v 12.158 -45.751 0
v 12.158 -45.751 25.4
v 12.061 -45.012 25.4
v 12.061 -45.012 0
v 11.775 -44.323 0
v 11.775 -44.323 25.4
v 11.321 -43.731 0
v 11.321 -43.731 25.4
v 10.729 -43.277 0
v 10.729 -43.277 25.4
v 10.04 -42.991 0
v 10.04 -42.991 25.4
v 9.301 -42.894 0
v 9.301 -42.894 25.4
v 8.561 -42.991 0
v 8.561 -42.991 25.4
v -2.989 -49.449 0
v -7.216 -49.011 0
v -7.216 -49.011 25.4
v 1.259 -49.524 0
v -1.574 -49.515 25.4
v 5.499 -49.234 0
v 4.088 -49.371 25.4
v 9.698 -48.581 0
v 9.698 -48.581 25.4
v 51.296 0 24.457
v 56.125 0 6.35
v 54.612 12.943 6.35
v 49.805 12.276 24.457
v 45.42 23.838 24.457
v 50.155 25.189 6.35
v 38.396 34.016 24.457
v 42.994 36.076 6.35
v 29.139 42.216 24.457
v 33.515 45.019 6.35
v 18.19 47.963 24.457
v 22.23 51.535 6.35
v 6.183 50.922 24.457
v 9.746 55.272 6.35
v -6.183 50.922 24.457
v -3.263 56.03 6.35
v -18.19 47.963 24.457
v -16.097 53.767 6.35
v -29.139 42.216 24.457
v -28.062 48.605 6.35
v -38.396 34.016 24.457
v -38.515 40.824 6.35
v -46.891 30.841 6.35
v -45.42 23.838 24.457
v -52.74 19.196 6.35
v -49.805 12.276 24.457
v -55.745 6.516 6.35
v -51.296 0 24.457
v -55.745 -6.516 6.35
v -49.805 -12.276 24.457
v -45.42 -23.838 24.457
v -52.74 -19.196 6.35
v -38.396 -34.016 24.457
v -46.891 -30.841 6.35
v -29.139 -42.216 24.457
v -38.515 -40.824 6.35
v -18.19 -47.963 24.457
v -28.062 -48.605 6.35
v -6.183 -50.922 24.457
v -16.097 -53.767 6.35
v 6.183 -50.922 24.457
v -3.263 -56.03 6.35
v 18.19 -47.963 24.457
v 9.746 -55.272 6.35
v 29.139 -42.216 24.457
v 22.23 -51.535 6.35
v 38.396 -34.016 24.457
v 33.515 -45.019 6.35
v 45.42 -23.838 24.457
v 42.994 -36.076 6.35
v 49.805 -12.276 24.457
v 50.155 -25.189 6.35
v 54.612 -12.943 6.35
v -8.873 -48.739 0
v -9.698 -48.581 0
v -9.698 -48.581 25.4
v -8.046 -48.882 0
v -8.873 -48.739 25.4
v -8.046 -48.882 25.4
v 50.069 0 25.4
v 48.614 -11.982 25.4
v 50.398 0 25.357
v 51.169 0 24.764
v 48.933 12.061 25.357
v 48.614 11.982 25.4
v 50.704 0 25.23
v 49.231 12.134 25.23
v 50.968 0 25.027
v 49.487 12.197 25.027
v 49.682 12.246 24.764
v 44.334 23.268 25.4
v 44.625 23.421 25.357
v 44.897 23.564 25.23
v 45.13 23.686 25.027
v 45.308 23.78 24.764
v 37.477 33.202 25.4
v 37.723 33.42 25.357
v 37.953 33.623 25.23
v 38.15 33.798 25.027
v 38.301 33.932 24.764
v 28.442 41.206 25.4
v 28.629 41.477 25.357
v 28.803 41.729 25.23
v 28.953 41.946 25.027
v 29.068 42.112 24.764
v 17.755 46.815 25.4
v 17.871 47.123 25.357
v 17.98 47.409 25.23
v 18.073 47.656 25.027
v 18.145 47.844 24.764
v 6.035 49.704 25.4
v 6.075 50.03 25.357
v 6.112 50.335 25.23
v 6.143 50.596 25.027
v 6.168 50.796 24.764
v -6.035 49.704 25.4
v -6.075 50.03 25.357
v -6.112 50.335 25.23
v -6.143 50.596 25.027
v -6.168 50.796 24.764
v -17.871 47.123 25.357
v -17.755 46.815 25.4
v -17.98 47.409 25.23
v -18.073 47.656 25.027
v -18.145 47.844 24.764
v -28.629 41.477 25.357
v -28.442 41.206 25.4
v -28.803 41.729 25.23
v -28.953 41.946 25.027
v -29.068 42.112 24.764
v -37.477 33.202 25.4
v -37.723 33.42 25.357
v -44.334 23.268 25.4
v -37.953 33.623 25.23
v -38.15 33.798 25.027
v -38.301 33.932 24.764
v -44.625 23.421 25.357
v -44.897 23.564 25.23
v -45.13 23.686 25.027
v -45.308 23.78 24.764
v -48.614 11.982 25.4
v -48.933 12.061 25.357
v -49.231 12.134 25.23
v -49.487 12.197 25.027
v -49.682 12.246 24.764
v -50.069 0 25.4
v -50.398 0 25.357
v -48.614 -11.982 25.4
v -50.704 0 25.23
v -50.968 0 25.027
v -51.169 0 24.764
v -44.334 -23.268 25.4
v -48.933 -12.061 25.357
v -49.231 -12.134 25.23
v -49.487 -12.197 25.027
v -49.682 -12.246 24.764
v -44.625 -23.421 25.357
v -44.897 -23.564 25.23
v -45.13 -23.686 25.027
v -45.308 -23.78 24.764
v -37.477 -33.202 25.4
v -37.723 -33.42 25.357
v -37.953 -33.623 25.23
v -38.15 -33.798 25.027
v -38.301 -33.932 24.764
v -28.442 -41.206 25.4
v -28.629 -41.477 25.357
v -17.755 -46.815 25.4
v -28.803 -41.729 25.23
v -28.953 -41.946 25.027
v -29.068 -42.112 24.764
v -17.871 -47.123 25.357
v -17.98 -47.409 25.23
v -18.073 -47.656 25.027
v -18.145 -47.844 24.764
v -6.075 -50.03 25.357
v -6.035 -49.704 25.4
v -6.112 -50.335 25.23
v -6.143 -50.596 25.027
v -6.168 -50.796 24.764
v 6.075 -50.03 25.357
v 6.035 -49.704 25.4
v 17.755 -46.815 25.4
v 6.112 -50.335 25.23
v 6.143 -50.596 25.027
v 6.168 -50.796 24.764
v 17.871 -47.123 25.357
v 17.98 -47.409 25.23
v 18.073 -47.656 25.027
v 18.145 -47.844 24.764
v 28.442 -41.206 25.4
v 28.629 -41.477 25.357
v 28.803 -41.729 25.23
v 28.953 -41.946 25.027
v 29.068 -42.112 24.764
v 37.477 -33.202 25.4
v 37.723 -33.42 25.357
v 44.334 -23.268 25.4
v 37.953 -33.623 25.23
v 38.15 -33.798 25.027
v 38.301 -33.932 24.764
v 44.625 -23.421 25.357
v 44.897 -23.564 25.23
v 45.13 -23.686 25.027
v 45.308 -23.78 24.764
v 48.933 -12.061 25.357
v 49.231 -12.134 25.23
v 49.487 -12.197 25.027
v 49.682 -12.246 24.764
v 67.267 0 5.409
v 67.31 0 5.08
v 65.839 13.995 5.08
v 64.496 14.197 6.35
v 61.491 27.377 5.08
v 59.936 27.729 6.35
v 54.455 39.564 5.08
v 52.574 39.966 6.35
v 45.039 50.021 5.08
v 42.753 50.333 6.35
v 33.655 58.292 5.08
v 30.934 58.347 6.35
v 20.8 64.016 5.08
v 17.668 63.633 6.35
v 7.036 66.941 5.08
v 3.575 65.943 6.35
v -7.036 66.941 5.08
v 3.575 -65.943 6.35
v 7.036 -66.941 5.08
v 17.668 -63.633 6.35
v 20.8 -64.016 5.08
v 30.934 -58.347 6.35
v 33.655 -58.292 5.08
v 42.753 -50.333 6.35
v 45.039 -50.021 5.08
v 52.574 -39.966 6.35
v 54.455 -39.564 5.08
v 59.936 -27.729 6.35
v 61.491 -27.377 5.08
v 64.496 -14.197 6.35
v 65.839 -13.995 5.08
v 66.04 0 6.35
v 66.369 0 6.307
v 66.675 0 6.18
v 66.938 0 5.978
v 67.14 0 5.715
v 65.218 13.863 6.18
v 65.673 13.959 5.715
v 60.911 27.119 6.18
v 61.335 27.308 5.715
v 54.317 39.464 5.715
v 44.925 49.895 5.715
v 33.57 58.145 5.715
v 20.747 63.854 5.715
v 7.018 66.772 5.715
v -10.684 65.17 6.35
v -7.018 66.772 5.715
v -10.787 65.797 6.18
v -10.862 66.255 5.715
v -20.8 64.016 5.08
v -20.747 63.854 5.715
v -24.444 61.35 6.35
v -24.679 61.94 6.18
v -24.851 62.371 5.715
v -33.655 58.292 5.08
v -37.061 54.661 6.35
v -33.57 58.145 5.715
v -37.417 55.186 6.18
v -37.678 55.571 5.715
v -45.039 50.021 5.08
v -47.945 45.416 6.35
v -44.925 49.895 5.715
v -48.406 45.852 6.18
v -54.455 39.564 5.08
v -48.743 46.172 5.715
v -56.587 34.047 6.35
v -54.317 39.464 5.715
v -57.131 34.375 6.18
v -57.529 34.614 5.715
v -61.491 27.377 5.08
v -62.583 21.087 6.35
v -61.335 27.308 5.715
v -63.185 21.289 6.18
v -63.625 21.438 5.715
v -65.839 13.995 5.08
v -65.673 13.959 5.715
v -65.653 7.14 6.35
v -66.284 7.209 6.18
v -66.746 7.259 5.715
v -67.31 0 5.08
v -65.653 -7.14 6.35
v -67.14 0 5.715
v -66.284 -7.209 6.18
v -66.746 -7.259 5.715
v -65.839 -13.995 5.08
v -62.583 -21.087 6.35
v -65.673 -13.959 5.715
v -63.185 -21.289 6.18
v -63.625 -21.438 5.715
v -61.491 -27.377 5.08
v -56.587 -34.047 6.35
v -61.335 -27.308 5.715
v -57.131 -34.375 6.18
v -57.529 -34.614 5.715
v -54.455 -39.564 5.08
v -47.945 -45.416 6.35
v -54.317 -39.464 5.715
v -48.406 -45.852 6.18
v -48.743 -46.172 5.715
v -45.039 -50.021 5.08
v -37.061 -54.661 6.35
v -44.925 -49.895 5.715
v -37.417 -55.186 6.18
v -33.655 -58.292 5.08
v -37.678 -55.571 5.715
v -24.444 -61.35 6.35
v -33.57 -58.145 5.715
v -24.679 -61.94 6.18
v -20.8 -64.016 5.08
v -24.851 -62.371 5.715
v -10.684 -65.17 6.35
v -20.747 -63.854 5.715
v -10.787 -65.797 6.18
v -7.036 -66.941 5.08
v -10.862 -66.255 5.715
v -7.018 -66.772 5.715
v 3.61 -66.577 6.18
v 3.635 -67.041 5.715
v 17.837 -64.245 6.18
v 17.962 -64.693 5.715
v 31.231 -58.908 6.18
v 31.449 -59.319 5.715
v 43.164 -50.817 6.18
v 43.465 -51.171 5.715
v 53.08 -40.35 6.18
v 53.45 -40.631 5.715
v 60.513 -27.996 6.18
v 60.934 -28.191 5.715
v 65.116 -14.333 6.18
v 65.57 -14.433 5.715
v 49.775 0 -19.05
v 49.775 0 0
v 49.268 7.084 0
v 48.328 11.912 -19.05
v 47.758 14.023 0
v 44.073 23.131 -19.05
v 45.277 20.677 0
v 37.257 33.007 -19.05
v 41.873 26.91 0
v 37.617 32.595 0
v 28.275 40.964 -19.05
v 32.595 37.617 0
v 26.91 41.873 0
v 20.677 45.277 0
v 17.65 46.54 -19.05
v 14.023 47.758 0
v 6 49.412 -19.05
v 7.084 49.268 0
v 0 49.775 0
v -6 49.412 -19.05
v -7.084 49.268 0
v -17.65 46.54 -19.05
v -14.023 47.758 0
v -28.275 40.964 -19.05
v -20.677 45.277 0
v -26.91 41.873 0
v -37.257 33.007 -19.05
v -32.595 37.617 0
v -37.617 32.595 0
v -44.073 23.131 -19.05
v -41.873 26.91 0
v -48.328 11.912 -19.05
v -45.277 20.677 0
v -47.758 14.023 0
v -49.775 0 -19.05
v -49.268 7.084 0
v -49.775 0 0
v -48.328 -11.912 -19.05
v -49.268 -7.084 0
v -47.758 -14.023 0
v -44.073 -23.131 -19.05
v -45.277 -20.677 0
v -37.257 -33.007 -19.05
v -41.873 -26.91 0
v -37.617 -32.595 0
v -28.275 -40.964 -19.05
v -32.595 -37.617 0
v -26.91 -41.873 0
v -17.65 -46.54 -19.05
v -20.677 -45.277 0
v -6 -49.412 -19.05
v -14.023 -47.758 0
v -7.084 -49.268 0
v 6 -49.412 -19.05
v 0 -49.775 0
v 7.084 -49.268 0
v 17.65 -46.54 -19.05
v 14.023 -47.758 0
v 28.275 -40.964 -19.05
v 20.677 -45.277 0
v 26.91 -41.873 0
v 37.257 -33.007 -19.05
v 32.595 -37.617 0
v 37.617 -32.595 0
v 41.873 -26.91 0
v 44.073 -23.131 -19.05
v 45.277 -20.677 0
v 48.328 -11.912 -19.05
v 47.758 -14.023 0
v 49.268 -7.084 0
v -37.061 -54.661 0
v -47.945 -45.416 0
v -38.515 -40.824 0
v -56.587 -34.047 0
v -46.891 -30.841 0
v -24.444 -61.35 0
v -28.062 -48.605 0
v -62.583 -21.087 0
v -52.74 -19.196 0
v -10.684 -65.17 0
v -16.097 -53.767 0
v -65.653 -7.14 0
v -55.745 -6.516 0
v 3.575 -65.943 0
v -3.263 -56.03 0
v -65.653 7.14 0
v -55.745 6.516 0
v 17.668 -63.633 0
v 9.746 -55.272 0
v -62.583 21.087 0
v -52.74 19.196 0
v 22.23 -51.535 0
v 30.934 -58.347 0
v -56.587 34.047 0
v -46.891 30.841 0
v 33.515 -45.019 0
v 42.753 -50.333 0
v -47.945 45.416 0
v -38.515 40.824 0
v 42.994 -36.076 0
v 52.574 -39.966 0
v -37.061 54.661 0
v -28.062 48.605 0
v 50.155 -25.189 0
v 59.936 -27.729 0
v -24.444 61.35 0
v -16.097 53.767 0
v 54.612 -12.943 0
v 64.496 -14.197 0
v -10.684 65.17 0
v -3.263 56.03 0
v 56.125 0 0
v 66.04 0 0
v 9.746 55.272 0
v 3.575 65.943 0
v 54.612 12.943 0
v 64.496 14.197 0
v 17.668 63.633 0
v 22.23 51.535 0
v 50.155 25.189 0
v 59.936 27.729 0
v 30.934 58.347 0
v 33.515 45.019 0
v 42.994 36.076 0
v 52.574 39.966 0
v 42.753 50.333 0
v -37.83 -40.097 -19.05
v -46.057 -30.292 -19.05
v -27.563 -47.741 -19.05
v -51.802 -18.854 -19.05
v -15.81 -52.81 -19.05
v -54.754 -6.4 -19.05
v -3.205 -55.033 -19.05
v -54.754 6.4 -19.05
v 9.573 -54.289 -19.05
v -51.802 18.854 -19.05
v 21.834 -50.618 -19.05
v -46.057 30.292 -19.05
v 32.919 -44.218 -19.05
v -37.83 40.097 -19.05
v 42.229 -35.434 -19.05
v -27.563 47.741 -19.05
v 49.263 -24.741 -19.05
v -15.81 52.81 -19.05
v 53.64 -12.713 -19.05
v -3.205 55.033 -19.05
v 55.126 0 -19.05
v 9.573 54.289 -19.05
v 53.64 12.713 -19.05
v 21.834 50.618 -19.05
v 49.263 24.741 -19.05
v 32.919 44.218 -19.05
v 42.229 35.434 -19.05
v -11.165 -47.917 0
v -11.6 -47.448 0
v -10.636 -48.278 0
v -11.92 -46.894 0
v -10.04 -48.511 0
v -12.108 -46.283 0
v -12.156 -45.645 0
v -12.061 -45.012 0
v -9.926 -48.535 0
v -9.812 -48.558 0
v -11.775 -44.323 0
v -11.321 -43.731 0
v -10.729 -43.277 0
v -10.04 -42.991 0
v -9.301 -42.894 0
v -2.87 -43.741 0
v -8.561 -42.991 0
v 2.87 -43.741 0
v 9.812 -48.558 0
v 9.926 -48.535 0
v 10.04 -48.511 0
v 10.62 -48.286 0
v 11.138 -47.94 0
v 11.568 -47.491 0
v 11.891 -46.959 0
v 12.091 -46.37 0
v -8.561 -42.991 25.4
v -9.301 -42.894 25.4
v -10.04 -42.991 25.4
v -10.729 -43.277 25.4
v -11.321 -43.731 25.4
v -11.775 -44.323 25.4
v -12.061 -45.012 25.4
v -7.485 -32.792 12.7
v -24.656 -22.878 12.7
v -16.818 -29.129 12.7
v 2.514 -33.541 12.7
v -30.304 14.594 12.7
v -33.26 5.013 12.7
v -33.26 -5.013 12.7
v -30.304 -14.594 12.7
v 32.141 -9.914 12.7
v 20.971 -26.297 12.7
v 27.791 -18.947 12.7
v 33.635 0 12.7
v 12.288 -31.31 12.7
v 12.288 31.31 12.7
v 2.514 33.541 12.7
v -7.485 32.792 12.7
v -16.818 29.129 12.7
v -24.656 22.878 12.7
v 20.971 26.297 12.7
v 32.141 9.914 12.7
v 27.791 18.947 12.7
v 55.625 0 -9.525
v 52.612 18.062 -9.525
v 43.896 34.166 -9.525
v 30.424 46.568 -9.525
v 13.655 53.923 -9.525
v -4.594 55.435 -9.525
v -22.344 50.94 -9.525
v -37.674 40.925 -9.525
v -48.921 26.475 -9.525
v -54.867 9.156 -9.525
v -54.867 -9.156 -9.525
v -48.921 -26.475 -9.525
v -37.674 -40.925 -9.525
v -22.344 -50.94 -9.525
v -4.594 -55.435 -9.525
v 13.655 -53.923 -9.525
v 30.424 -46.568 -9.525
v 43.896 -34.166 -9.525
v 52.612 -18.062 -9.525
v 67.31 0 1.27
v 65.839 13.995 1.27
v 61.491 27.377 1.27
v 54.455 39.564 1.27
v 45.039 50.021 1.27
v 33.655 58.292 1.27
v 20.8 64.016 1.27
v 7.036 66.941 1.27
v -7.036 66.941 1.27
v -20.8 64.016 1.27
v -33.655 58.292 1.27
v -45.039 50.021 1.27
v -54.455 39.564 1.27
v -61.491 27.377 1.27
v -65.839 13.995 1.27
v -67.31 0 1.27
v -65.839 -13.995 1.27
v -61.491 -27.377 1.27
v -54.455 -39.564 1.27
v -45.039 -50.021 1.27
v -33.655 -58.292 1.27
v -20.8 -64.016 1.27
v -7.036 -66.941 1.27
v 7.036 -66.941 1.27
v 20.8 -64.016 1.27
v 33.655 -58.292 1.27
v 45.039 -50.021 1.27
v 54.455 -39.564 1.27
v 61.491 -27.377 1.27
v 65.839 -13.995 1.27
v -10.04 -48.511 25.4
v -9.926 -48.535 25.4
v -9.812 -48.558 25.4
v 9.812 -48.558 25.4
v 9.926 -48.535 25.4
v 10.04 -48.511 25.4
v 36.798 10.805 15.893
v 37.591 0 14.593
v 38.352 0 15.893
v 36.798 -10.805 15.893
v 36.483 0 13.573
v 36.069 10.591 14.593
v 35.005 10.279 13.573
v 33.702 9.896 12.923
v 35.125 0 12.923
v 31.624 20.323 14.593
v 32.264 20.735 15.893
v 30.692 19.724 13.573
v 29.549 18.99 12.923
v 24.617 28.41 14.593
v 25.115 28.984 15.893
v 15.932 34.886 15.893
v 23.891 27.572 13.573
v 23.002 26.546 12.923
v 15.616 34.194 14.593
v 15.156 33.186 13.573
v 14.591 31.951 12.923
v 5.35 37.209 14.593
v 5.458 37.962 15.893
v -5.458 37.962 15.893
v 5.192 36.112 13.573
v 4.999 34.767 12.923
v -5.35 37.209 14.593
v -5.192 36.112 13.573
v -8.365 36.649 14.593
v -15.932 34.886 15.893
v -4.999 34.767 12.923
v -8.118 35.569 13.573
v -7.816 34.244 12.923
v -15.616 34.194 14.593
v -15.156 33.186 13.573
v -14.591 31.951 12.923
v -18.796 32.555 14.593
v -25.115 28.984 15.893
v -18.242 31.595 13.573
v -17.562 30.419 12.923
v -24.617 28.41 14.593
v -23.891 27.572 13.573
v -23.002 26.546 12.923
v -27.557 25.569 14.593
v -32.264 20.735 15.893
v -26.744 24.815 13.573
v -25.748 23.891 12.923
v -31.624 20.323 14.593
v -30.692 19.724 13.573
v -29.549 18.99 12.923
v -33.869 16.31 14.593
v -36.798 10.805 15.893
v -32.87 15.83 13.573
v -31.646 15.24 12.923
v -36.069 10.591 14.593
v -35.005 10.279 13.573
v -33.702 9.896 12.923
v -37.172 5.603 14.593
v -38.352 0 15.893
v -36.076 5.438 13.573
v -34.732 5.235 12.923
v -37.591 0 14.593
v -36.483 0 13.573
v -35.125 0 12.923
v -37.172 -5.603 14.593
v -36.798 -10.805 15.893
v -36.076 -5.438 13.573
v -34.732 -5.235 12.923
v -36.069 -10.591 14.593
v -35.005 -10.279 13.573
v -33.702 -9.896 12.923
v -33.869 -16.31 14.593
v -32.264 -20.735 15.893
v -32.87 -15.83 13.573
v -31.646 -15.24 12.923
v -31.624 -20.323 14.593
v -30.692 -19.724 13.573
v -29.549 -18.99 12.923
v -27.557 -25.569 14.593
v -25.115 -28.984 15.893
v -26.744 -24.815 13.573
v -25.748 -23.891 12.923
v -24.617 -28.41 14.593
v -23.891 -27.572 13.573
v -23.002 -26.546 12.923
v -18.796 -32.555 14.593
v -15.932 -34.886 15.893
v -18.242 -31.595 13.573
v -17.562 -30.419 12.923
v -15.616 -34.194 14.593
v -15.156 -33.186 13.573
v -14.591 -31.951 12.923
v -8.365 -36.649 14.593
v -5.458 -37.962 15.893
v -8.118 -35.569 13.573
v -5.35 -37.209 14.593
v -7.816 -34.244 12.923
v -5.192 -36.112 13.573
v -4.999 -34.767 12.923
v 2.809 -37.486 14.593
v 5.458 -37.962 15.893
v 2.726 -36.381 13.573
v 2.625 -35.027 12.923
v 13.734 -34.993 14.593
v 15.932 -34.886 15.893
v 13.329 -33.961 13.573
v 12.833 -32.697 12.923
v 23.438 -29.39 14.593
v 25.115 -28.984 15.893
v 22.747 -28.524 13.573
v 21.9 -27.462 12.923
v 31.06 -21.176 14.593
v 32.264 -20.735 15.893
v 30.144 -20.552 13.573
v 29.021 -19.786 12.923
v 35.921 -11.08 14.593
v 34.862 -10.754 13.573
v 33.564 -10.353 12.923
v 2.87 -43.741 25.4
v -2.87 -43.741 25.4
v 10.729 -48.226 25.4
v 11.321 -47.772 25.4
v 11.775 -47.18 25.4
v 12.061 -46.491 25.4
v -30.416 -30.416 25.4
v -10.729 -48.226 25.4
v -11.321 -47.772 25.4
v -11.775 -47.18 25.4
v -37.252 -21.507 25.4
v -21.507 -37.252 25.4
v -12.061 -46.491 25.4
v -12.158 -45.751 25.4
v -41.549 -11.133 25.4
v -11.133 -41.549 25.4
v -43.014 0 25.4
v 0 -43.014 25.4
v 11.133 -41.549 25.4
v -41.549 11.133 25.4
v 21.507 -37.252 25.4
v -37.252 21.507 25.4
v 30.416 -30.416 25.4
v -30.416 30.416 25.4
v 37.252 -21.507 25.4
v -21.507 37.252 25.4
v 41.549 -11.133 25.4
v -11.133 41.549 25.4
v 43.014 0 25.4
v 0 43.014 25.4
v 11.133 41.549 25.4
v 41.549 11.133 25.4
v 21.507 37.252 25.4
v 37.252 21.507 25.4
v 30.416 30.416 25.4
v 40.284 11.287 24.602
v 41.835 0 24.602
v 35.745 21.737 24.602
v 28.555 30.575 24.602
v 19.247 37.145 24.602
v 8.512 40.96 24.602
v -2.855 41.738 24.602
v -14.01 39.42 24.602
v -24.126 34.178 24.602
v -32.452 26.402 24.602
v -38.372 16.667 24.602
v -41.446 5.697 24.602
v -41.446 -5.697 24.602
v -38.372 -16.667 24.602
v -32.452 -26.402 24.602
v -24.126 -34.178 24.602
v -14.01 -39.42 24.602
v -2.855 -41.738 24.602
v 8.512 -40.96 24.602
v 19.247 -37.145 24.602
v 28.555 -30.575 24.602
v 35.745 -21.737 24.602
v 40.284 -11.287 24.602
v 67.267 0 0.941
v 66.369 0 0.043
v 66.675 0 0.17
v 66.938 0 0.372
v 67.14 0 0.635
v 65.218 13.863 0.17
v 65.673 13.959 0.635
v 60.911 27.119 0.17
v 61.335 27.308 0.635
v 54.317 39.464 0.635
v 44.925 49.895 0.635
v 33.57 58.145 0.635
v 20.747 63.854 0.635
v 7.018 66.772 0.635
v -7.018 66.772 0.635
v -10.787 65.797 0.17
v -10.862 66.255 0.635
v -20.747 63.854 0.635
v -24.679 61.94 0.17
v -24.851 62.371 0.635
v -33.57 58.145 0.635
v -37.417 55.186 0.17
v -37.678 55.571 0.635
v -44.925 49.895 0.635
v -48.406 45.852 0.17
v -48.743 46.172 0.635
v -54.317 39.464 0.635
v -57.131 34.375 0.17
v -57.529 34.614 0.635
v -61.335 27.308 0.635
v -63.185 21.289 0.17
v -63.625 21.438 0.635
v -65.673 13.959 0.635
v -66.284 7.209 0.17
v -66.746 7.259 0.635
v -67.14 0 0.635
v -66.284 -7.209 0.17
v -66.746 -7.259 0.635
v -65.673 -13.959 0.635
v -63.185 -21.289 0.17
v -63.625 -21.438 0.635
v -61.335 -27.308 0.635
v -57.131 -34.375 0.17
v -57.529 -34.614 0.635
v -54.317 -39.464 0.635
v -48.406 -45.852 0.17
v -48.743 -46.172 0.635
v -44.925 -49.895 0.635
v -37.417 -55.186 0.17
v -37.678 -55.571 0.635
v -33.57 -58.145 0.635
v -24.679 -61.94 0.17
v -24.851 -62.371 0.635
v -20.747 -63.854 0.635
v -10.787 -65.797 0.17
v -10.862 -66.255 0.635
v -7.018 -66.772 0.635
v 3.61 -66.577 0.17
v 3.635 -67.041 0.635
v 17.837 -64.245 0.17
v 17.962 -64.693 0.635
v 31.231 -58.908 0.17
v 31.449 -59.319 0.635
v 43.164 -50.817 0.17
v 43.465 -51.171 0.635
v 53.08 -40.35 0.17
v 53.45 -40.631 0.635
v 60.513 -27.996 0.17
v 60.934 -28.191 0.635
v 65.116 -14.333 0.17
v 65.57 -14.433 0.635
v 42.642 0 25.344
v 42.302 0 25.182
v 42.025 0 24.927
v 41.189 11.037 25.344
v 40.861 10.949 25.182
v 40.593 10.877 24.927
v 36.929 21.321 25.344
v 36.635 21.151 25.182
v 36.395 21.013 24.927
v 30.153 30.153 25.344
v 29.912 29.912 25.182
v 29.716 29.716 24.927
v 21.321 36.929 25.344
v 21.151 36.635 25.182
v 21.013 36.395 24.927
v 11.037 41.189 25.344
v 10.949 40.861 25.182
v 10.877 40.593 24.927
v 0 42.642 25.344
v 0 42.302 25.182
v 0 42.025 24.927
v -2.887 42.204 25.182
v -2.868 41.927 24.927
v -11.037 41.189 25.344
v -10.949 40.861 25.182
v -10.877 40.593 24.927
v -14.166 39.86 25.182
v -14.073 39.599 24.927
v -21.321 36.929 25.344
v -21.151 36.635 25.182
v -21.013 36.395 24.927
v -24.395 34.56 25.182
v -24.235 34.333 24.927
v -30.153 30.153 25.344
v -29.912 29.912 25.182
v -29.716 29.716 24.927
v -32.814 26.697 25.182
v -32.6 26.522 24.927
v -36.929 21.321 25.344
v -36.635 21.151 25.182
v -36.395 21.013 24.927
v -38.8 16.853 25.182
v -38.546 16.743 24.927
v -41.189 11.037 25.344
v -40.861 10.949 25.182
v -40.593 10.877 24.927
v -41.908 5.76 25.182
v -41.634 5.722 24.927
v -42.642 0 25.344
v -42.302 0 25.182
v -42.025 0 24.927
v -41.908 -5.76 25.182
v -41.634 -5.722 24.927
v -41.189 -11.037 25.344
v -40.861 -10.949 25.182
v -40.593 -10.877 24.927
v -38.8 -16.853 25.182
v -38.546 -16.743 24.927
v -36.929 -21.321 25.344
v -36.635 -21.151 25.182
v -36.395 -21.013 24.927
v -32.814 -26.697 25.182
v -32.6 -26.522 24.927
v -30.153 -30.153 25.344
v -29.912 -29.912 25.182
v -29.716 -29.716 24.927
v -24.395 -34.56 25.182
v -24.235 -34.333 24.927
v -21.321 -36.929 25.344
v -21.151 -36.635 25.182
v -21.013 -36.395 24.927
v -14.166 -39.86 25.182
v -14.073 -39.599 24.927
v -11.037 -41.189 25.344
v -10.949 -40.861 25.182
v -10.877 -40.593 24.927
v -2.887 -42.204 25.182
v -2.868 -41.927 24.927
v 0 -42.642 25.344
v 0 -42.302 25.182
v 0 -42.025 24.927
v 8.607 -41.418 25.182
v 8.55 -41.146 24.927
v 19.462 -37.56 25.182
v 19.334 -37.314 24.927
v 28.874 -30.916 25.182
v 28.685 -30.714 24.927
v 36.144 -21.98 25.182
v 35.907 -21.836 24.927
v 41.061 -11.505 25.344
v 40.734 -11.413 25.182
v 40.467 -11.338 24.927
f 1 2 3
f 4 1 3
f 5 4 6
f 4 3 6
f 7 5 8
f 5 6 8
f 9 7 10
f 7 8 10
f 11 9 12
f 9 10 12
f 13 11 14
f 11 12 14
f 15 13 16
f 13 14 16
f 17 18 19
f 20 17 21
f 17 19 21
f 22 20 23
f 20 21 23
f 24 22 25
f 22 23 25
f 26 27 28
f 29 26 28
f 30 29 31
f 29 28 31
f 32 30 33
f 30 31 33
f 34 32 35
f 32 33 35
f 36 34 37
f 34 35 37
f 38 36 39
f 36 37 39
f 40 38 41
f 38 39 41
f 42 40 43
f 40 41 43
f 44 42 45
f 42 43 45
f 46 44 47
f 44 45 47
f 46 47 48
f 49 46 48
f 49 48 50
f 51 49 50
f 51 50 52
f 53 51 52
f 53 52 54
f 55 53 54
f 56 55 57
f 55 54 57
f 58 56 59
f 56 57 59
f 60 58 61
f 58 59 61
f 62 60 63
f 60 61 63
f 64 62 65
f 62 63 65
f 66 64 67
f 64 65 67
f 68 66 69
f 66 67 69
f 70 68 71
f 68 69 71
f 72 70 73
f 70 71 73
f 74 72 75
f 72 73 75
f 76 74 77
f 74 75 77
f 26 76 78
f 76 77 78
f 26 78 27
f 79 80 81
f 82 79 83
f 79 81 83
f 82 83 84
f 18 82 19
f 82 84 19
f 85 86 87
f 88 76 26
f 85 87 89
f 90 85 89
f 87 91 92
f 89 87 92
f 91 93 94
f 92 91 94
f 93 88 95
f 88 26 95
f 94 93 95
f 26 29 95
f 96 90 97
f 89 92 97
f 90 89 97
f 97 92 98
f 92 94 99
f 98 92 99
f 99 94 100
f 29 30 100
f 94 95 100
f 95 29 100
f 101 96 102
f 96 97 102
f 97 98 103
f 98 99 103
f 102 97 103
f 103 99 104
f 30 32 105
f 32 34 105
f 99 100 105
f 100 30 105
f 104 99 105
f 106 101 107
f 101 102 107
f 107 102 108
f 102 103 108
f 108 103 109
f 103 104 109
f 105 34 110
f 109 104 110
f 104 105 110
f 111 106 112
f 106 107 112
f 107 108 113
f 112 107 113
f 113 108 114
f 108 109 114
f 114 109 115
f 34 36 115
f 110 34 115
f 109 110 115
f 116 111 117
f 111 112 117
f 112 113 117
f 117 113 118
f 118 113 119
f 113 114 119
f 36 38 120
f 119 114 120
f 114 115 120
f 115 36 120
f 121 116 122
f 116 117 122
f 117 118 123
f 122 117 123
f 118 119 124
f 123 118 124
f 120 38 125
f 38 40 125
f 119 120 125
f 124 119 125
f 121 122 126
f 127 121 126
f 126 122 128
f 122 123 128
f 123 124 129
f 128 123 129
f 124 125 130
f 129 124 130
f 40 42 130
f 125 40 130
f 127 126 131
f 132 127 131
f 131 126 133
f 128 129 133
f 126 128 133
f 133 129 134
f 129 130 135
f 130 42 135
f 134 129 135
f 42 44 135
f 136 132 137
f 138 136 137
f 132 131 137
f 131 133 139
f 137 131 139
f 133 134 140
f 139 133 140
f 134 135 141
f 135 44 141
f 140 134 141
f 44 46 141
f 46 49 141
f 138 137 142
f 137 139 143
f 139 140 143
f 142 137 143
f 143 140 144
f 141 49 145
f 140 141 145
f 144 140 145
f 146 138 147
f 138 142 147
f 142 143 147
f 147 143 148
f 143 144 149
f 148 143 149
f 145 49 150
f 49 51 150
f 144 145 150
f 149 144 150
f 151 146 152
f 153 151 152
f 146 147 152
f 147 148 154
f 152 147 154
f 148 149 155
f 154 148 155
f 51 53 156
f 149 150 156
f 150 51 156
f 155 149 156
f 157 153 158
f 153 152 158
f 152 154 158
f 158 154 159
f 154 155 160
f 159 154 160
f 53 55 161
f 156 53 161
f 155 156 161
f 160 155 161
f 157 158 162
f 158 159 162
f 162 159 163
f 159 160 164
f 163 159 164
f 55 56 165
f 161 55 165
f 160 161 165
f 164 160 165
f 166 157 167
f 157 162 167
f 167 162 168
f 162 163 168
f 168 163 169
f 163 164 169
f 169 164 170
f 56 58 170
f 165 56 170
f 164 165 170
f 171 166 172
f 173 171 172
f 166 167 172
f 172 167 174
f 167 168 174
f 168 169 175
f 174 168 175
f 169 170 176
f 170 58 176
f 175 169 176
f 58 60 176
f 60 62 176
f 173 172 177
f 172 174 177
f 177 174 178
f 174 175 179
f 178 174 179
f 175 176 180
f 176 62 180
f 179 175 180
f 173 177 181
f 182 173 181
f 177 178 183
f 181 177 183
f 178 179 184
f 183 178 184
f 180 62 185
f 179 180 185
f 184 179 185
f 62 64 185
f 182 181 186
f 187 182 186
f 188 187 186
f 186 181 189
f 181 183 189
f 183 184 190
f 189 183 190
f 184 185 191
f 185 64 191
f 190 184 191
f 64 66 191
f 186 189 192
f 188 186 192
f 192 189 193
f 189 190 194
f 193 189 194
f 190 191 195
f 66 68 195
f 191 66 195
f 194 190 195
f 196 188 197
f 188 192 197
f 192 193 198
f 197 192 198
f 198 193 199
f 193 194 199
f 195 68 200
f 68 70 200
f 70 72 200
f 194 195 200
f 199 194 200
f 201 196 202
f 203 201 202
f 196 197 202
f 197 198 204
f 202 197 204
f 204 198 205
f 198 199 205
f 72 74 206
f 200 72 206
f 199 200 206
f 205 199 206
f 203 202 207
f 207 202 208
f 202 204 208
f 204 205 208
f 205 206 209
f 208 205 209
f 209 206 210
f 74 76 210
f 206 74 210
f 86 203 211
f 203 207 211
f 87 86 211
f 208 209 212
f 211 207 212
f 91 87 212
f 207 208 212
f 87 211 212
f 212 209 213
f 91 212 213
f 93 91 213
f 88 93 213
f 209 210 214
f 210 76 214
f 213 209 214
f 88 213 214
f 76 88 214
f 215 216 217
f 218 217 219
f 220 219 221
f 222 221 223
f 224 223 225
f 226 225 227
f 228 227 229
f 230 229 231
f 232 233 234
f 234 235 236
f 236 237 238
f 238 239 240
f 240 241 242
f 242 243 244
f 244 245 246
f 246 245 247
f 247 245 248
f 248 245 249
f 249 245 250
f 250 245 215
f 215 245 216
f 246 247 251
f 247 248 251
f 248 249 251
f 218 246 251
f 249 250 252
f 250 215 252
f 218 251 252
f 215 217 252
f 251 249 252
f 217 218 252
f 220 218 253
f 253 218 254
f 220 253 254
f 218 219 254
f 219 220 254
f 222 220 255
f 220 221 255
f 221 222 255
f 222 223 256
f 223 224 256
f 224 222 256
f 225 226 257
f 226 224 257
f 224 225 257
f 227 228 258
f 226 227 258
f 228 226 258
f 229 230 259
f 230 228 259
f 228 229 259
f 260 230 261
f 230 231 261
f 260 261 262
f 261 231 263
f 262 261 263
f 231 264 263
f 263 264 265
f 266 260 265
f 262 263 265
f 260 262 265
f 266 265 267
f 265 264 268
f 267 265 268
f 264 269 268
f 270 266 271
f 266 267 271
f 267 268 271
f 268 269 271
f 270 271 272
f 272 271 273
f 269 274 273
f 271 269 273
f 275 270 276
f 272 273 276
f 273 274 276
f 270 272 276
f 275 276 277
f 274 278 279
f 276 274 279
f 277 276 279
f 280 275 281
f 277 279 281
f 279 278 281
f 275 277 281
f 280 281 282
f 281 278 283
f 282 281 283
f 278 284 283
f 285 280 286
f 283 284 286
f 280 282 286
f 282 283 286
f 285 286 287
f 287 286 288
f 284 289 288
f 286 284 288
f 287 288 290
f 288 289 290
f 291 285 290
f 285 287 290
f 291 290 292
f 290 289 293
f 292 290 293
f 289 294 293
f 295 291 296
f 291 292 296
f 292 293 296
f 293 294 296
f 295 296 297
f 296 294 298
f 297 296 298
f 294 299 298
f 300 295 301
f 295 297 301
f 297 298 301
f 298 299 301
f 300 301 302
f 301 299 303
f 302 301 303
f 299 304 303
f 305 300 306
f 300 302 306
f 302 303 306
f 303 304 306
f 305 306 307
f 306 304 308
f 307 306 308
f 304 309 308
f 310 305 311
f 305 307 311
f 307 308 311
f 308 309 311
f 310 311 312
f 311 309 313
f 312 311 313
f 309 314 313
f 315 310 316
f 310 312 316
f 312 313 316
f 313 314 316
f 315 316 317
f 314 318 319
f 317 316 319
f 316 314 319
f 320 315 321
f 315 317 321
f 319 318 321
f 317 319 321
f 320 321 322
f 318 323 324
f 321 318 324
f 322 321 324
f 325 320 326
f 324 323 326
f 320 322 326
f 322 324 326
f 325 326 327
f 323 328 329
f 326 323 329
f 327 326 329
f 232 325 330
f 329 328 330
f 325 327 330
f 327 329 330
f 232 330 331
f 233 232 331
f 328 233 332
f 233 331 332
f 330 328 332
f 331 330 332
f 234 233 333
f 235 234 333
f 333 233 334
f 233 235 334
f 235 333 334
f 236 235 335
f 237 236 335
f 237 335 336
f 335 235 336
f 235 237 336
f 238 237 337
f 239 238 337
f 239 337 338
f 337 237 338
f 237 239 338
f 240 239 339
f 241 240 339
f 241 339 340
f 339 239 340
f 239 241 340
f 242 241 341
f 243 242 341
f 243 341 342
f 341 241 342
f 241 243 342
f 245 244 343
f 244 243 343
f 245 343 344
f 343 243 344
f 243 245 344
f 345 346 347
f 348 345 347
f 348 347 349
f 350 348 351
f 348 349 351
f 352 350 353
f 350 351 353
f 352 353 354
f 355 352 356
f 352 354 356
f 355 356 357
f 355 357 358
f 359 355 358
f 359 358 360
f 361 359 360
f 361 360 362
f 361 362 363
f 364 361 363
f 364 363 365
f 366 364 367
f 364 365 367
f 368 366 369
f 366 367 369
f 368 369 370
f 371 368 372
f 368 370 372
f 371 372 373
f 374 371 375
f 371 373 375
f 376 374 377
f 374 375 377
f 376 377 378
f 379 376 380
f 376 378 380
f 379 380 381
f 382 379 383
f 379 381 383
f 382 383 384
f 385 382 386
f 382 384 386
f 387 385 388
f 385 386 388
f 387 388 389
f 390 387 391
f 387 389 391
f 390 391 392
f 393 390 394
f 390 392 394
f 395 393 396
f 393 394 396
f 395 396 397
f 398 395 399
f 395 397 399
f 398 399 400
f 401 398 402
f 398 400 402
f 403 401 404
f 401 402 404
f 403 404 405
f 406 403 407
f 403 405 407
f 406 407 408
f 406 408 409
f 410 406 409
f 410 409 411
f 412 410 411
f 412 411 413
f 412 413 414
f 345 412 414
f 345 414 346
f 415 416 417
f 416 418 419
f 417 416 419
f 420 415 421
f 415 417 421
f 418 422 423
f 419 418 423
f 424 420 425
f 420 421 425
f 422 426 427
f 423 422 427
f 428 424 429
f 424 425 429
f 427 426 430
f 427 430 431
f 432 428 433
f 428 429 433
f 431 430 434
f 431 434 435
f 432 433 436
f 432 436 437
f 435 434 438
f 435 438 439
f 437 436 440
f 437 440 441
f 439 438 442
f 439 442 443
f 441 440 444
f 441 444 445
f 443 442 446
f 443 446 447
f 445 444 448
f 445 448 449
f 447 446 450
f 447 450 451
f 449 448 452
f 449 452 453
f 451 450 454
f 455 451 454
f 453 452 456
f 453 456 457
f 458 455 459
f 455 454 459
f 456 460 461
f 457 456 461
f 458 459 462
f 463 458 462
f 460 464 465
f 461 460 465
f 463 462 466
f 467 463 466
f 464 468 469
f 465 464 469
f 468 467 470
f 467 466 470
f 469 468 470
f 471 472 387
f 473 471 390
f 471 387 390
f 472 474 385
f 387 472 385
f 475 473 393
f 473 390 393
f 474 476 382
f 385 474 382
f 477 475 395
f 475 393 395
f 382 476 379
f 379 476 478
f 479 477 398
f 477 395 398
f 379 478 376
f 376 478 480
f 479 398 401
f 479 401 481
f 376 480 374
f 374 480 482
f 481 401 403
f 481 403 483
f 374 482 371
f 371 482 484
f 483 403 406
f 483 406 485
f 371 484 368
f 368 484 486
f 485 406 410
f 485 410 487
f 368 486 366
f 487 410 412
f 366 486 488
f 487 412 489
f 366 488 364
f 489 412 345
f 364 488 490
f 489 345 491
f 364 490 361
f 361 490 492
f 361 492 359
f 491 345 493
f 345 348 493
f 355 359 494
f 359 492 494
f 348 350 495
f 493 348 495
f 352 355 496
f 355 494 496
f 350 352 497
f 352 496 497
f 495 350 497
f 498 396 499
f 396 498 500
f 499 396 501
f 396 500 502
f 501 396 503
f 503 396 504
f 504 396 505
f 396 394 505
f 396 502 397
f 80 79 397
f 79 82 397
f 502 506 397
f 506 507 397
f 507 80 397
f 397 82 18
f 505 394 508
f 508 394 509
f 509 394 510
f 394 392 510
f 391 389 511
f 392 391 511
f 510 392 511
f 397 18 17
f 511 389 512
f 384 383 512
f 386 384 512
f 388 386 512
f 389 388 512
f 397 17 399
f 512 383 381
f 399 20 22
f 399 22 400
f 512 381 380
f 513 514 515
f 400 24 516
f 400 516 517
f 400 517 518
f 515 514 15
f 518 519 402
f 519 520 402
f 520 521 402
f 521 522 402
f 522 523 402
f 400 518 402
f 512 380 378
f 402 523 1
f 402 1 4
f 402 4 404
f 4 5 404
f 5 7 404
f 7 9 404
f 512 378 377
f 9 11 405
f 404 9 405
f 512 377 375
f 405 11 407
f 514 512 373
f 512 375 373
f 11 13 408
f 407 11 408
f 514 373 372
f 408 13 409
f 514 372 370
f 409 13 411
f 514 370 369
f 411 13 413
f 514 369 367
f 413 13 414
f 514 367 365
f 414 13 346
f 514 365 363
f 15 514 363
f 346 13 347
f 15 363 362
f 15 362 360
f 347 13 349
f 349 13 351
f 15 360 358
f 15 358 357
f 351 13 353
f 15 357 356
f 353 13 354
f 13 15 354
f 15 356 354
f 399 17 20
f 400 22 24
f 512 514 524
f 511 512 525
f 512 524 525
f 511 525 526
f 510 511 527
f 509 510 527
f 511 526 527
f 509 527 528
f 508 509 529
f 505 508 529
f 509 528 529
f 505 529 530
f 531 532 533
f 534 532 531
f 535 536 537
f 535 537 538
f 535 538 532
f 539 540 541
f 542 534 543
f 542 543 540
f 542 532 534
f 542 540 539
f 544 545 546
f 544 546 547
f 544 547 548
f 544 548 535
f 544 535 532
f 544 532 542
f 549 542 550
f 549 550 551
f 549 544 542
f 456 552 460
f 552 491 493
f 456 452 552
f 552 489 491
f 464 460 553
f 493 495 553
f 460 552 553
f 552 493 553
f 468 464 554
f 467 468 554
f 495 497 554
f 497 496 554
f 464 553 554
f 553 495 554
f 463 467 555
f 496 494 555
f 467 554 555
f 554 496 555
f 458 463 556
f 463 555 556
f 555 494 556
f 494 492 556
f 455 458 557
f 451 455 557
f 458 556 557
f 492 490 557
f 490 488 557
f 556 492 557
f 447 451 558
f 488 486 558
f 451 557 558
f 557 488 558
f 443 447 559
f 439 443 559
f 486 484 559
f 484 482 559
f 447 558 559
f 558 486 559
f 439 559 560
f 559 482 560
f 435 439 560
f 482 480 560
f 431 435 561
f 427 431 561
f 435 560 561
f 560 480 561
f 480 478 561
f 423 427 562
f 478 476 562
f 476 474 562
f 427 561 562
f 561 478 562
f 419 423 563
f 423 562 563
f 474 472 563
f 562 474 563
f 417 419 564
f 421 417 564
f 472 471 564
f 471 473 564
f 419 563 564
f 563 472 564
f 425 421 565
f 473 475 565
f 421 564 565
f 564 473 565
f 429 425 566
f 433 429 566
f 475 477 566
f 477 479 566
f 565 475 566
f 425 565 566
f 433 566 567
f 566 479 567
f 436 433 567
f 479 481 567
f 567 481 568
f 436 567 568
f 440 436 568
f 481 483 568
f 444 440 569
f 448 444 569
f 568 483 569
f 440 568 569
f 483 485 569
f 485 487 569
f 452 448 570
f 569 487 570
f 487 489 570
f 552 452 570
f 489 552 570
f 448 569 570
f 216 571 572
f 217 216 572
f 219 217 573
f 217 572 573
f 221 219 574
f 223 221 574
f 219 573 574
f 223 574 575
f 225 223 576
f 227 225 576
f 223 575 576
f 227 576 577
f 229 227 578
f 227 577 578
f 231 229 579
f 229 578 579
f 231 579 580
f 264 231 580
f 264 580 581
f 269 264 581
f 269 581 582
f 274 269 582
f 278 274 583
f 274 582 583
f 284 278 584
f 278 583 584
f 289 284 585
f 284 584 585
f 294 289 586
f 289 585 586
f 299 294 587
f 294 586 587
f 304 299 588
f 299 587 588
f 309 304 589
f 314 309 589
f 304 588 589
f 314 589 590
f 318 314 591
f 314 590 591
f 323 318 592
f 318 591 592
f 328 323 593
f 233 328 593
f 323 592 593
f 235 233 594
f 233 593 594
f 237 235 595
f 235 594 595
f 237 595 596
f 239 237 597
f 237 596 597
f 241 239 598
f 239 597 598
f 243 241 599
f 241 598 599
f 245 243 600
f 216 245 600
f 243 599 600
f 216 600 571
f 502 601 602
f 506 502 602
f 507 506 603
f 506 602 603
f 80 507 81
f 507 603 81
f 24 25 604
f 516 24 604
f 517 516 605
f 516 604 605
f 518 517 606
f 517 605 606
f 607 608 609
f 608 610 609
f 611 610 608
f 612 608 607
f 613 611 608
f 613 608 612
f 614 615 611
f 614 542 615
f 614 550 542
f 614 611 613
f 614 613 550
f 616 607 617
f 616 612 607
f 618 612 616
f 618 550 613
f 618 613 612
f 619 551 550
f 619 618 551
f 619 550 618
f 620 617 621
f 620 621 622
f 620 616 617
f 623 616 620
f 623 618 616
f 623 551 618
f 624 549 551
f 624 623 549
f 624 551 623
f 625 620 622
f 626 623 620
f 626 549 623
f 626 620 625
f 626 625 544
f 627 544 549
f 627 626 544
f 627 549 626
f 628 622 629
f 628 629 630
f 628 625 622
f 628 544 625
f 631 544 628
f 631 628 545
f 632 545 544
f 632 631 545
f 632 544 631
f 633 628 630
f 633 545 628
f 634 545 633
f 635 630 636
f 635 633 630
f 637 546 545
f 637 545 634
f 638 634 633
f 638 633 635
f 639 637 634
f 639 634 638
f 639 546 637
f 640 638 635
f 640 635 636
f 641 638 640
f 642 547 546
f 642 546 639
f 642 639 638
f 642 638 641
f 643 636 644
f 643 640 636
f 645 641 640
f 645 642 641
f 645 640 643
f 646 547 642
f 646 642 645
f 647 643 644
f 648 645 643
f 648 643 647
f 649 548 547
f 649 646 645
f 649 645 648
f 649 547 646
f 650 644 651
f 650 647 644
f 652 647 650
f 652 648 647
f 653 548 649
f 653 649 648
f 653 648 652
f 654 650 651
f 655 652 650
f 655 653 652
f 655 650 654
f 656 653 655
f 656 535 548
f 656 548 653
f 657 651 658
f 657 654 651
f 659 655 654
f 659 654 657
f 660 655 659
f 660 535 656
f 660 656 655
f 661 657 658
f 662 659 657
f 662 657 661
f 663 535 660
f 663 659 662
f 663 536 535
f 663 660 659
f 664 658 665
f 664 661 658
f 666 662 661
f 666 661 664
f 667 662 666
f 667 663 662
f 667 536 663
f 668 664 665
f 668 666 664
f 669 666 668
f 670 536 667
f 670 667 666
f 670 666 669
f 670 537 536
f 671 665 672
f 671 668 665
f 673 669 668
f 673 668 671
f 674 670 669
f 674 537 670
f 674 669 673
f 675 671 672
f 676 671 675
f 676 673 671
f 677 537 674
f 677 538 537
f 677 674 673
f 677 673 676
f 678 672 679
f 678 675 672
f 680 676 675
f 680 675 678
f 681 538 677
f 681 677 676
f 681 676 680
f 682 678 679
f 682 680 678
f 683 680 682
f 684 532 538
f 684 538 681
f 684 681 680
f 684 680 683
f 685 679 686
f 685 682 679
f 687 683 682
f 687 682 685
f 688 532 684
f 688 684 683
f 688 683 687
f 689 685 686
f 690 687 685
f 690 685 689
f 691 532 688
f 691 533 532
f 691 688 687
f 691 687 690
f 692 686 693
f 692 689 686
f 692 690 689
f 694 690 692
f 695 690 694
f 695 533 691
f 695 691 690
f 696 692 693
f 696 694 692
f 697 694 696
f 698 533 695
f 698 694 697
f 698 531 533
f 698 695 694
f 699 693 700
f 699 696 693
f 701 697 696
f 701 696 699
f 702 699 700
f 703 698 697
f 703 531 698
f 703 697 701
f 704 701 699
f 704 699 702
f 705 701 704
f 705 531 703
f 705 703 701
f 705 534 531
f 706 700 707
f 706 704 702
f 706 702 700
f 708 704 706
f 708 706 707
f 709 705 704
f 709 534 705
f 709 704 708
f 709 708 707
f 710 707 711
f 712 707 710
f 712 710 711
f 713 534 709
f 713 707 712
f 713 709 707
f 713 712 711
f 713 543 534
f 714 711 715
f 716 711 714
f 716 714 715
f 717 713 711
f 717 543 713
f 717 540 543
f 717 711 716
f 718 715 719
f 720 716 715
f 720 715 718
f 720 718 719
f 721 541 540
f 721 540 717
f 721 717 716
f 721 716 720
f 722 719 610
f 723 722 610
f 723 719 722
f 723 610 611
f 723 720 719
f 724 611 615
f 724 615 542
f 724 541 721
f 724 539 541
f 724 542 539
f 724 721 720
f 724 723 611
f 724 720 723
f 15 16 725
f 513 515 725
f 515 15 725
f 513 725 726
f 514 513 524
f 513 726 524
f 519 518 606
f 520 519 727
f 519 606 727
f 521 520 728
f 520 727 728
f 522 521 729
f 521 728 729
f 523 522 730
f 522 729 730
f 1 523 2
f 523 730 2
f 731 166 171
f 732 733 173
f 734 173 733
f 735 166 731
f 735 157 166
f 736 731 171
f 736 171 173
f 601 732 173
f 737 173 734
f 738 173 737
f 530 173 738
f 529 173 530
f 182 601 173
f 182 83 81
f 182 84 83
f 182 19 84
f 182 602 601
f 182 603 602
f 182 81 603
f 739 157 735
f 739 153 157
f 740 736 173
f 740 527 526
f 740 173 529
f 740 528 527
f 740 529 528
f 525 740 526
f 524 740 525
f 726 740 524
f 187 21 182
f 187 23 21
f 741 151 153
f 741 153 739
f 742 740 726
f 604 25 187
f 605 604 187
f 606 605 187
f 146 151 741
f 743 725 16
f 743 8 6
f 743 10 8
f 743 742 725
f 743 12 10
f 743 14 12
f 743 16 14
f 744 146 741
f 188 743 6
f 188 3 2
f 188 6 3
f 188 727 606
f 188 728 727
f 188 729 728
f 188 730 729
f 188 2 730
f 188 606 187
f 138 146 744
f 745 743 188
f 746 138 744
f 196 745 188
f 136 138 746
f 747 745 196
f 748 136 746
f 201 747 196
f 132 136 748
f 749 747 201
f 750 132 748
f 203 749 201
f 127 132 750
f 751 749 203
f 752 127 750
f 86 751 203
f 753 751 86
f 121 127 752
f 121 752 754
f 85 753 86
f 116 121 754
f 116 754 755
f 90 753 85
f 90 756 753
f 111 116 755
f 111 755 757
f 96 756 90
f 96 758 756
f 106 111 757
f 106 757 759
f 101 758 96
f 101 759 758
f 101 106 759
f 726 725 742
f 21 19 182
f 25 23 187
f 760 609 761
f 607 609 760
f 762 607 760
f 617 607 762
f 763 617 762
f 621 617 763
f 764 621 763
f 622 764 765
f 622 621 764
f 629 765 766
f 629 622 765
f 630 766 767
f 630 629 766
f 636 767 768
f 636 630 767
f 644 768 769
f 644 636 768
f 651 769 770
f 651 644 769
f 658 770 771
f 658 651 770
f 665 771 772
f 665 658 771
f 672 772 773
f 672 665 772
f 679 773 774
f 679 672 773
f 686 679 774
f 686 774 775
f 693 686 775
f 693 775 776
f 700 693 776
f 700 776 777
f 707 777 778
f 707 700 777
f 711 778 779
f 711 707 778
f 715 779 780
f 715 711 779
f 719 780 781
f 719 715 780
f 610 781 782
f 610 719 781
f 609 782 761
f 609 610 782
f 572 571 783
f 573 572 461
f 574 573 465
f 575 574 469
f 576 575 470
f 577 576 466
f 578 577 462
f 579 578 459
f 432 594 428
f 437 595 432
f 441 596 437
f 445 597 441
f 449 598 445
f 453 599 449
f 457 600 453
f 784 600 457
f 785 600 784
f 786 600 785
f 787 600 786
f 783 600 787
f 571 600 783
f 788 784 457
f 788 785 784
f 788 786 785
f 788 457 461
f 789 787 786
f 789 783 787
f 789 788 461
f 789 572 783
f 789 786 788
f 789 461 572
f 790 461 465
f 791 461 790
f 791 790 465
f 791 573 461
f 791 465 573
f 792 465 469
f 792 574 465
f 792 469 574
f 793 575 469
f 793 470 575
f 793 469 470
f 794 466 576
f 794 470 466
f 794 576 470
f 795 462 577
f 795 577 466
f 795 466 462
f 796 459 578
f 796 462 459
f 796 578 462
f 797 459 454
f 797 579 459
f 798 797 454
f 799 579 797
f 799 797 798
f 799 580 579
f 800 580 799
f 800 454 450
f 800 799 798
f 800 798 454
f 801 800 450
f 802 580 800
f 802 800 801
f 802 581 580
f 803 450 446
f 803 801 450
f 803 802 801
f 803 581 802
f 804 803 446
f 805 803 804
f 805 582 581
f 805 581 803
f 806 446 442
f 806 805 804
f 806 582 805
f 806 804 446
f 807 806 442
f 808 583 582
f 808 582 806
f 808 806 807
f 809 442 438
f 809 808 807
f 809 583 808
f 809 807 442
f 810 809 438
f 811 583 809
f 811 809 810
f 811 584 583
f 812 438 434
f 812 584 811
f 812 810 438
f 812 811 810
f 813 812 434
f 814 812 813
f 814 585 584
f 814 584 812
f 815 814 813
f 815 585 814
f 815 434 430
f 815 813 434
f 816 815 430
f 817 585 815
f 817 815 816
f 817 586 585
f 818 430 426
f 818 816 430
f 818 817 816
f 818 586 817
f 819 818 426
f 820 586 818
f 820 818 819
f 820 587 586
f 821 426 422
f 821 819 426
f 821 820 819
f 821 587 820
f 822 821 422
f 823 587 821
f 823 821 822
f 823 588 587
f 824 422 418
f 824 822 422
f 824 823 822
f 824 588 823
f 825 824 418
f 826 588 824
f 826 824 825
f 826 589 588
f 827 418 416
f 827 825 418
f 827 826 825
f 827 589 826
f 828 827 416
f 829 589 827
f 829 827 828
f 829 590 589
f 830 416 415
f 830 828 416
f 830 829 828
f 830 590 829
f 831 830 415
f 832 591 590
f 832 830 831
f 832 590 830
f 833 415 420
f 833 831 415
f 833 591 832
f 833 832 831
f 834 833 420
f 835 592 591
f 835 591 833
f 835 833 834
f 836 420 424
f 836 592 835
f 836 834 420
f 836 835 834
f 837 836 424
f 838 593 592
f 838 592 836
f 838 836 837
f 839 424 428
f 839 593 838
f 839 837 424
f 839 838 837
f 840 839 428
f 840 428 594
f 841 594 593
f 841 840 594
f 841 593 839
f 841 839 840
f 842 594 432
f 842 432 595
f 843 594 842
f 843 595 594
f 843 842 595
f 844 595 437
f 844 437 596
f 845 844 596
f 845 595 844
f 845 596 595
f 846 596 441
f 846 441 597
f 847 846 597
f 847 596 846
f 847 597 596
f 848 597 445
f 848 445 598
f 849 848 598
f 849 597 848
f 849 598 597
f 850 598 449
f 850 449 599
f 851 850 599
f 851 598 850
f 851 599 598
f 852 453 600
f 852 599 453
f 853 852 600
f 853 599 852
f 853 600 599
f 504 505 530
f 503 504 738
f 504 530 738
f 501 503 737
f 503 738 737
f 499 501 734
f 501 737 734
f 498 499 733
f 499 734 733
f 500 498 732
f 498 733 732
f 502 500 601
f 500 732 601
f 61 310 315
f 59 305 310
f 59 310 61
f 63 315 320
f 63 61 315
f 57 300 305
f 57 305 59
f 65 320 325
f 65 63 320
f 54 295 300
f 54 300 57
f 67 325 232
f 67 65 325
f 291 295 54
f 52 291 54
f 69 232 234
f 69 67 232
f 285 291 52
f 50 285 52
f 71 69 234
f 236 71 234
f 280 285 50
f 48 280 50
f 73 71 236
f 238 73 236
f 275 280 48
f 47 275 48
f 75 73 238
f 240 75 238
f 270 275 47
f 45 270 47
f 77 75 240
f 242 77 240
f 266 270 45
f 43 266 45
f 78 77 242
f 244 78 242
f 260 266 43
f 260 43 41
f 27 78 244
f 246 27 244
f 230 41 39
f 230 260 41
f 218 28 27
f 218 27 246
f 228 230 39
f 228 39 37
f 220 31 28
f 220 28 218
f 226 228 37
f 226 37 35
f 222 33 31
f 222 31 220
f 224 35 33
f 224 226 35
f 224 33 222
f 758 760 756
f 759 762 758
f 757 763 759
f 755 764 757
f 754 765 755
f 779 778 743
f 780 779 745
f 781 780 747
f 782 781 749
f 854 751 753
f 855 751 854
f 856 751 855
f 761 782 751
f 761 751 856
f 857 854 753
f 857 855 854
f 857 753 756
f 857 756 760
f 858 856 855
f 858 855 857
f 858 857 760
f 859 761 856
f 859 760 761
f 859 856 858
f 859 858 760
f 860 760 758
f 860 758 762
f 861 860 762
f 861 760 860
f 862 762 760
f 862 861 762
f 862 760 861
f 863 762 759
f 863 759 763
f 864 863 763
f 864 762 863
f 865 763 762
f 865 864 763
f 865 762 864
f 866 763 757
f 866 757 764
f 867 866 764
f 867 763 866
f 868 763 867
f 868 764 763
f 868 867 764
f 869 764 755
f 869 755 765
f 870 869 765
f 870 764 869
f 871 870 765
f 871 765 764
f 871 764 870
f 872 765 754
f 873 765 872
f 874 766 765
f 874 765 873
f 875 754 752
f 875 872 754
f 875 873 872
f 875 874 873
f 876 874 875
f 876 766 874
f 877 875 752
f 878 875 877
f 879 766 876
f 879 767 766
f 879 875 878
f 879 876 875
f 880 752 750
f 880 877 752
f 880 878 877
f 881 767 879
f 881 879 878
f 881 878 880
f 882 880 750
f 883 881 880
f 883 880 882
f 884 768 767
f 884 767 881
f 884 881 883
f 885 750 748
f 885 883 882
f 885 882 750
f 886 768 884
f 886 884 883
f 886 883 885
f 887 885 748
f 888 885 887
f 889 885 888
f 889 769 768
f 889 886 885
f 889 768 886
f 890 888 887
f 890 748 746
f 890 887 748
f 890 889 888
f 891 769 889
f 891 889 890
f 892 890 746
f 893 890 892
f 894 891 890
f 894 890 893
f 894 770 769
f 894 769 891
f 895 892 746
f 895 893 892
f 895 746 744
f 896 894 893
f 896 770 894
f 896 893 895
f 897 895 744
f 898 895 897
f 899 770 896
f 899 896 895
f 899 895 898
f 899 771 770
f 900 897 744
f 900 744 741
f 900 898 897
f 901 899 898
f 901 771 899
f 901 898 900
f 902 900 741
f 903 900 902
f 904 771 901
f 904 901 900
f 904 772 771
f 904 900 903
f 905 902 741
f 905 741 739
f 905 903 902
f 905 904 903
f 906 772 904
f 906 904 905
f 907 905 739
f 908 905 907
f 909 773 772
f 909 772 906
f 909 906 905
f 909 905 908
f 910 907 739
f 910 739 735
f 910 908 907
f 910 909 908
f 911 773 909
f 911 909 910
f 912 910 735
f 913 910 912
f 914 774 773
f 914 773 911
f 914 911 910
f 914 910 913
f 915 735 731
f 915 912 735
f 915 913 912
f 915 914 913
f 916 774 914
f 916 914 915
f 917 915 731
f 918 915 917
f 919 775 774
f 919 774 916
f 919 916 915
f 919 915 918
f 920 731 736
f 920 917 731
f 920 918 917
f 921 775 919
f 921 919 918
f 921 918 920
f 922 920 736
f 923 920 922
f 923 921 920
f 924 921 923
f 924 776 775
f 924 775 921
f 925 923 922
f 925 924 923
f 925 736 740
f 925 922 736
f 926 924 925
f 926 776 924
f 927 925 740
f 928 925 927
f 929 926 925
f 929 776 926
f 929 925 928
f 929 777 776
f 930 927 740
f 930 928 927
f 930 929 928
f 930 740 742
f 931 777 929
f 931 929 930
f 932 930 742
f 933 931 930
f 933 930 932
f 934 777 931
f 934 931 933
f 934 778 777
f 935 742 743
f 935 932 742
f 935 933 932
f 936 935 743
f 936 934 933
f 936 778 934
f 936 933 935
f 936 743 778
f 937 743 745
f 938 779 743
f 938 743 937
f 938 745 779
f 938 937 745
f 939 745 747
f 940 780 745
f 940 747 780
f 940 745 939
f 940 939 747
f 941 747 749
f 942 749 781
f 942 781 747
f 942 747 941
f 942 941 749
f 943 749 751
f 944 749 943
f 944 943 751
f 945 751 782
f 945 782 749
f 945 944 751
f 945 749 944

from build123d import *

# Parameters (mm, degrees)
F0_R     = 67.31
F0_R_2   = 56.1246274
F1_DEPTH = 6.35
F0_R_3   = 49.7746274
F2_DEPTH = 19.05
F0_R_4   = 43.4246274
F0_R_5   = 37.0746274
F3_DEPTH = 25.4
F4_SIZE2 = 0.998358
F4_SIZE  = 19.04999
F5_SIZE2 = 19.04999
F5_SIZE  = 5.07999
F6_SIZE2 = 12.7
F6_SIZE  = 5.08
F7_DEPTH = 12.7
F9_DEPTH = 127
F10_R    = 1.27
F11_R    = 5.08


# Not quite as in the source:
# - a fillet or chamfer is up to 0.001 mm smaller than in the source, because OpenCascade refuses the exact size


with BuildPart() as f1:
    # F0 (on Top) → F1 (new body)
    with BuildSketch(Plane.XY):
        Circle(F0_R)
        Circle(F0_R_2, mode=Mode.SUBTRACT)
    extrude(amount=F1_DEPTH)



with BuildPart() as f2:
    # F0 (on Top) → F2 (new body)
    with BuildSketch(Plane.XY):
        Circle(F0_R_2)
        Circle(F0_R_3, mode=Mode.SUBTRACT)
    extrude(amount=-F2_DEPTH)


with BuildPart() as f1_1:
    add(f1.part)

    add(f2.part)  # F3 merges F2
    # F0 (on Top) → F3 (join)
    with BuildSketch(Plane.XY):
        Circle(F0_R_2)
        Circle(F0_R_3, mode=Mode.SUBTRACT)
        Circle(F0_R_3)
        Circle(F0_R_4, mode=Mode.SUBTRACT)
        Circle(F0_R_4)
        Circle(F0_R_5, mode=Mode.SUBTRACT)
    extrude(amount=F3_DEPTH)

    # F4 (size 19.05 and 0.9983681953 in the source; OpenCascade refuses exactly that, so slightly less here)
    f4_edges = [f1_1.edges().sort_by_distance(p)[0] for p in [
        (-56.124627, 0, -19.05),
    ]]
    f4_side = f1_1.faces().sort_by_distance((-56.124627, 0, -9.525))[0]
    chamfer(f4_edges, length=F4_SIZE, length2=F4_SIZE2, reference=f4_side)

    # F5 (size 5.08 and 19.05 in the source; OpenCascade refuses exactly that, so slightly less here)
    f5_edges = [f1_1.edges().sort_by_distance(p)[0] for p in [
        (-56.124627, 0, 25.4),
    ]]
    f5_side = f1_1.faces().sort_by_distance((-54.537183, 0, 25.4))[0]
    chamfer(f5_edges, length=F5_SIZE, length2=F5_SIZE2, reference=f5_side)

    # F6
    f6_edges = [f1_1.edges().sort_by_distance(p)[0] for p in [
        (-37.074627, 0, 25.4),
    ]]
    f6_side = f1_1.faces().sort_by_distance((-49.600877, 0, 25.4))[0]
    chamfer(f6_edges, length=F6_SIZE, length2=F6_SIZE2, reference=f6_side)

    # F0 (on Top) → F7 (join)
    with BuildSketch(Plane.XY):
        Circle(F0_R_5)
    extrude(amount=F7_DEPTH)

    # F8 (on face) → F9 (cut)
    with BuildSketch(Plane.XY.offset(25.4)):
        with BuildLine():
            ThreePointArc((-8.5611625958, -42.9912259739), (-10.7294880172, -43.2766914312), (-12.0608710658, -45.0117836011))
            Line((-12.0608710658, -45.0117836011), (-9.3007380172, -45.7513590225))
            Line((-9.3007380172, -45.7513590225), (-6.5406049686, -46.4909344439))
            ThreePointArc((-6.5406049686, -46.4909344439), (-6.4676843258, -46.1243376168), (-6.4432380172, -45.7513590225))
            ThreePointArc((-6.4432380172, -45.7513590225), (-7.0337308473, -44.0118232391), (-8.5611625958, -42.9912259739))
        make_face()
        with BuildLine():
            ThreePointArc((8.5611625958, -42.9912259739), (0, -43.8353626166), (-8.5611625958, -42.9912259739))
            Line((-8.5611625958, -42.9912259739), (-5.8010295472, -43.7308013952))
            Line((-5.8010295472, -43.7308013952), (-6.5406049686, -46.4909344439))
            Line((-6.5406049686, -46.4909344439), (-7.215923084, -49.0112559618))
            ThreePointArc((-7.215923084, -49.0112559618), (1.2593028677, -49.5235995582), (9.6975364764, -48.581174782))
            ThreePointArc((9.6975364764, -48.581174782), (6.5005137528, -46.3206132005), (8.5611625958, -42.9912259739))
        make_face()
        with BuildLine():
            Line((-9.3007380172, -45.7513590225), (-12.0608710658, -45.0117836011))
            ThreePointArc((-12.0608710658, -45.0117836011), (-11.7754056085, -47.1801090225), (-10.0403134386, -48.5114920711))
            ThreePointArc((-10.0403134386, -48.5114920711), (-9.8689864594, -48.5466359615), (-9.6975364764, -48.581174782))
            ThreePointArc((-9.6975364764, -48.581174782), (-7.7232039405, -48.1339400782), (-6.5406049686, -46.4909344439))
            Line((-6.5406049686, -46.4909344439), (-9.3007380172, -45.7513590225))
        make_face()
        with BuildLine():
            Line((-5.8010295472, -43.7308013952), (-8.5611625958, -42.9912259739))
            ThreePointArc((-8.5611625958, -42.9912259739), (-7.0337308473, -44.0118232391), (-6.4432380172, -45.7513590225))
            ThreePointArc((-6.4432380172, -45.7513590225), (-6.4676843258, -46.1243376168), (-6.5406049686, -46.4909344439))
            Line((-6.5406049686, -46.4909344439), (-5.8010295472, -43.7308013952))
        make_face()
        with BuildLine():
            ThreePointArc((-6.5406049686, -46.4909344439), (-7.7232039405, -48.1339400782), (-9.6975364764, -48.581174782))
            ThreePointArc((-9.6975364764, -48.581174782), (-8.4594634008, -48.8119886491), (-7.215923084, -49.0112559618))
            Line((-7.215923084, -49.0112559618), (-6.5406049686, -46.4909344439))
        make_face()
        with BuildLine():
            ThreePointArc((12.1582380172, -45.7513590225), (11.0402738006, -43.4843518526), (8.5611625958, -42.9912259739))
            ThreePointArc((8.5611625958, -42.9912259739), (6.5005137528, -46.3206132005), (9.6975364764, -48.581174782))
            ThreePointArc((9.6975364764, -48.581174782), (9.8689864594, -48.5466359615), (10.0403134386, -48.5114920711))
            ThreePointArc((10.0403134386, -48.5114920711), (11.5677451871, -47.4908948059), (12.1582380172, -45.7513590225))
        make_face()
    extrude(amount=-F9_DEPTH, mode=Mode.SUBTRACT)

    # F10
    f10_edges = [f1_1.edges().sort_by_distance(p)[0] for p in [
        (-67.31, 0, 6.35),
        (-51.044637, 0, 25.4),
        (-67.31, 0, 0),
        (-42.154627, 0, 25.4),
    ]]
    fillet(f10_edges, radius=F10_R)

    # F11
    f11_edges = [f1_1.edges().sort_by_distance(p)[0] for p in [
        (-37.074627, 0, 12.7),
    ]]
    fillet(f11_edges, radius=F11_R)


solid = f1_1.part
